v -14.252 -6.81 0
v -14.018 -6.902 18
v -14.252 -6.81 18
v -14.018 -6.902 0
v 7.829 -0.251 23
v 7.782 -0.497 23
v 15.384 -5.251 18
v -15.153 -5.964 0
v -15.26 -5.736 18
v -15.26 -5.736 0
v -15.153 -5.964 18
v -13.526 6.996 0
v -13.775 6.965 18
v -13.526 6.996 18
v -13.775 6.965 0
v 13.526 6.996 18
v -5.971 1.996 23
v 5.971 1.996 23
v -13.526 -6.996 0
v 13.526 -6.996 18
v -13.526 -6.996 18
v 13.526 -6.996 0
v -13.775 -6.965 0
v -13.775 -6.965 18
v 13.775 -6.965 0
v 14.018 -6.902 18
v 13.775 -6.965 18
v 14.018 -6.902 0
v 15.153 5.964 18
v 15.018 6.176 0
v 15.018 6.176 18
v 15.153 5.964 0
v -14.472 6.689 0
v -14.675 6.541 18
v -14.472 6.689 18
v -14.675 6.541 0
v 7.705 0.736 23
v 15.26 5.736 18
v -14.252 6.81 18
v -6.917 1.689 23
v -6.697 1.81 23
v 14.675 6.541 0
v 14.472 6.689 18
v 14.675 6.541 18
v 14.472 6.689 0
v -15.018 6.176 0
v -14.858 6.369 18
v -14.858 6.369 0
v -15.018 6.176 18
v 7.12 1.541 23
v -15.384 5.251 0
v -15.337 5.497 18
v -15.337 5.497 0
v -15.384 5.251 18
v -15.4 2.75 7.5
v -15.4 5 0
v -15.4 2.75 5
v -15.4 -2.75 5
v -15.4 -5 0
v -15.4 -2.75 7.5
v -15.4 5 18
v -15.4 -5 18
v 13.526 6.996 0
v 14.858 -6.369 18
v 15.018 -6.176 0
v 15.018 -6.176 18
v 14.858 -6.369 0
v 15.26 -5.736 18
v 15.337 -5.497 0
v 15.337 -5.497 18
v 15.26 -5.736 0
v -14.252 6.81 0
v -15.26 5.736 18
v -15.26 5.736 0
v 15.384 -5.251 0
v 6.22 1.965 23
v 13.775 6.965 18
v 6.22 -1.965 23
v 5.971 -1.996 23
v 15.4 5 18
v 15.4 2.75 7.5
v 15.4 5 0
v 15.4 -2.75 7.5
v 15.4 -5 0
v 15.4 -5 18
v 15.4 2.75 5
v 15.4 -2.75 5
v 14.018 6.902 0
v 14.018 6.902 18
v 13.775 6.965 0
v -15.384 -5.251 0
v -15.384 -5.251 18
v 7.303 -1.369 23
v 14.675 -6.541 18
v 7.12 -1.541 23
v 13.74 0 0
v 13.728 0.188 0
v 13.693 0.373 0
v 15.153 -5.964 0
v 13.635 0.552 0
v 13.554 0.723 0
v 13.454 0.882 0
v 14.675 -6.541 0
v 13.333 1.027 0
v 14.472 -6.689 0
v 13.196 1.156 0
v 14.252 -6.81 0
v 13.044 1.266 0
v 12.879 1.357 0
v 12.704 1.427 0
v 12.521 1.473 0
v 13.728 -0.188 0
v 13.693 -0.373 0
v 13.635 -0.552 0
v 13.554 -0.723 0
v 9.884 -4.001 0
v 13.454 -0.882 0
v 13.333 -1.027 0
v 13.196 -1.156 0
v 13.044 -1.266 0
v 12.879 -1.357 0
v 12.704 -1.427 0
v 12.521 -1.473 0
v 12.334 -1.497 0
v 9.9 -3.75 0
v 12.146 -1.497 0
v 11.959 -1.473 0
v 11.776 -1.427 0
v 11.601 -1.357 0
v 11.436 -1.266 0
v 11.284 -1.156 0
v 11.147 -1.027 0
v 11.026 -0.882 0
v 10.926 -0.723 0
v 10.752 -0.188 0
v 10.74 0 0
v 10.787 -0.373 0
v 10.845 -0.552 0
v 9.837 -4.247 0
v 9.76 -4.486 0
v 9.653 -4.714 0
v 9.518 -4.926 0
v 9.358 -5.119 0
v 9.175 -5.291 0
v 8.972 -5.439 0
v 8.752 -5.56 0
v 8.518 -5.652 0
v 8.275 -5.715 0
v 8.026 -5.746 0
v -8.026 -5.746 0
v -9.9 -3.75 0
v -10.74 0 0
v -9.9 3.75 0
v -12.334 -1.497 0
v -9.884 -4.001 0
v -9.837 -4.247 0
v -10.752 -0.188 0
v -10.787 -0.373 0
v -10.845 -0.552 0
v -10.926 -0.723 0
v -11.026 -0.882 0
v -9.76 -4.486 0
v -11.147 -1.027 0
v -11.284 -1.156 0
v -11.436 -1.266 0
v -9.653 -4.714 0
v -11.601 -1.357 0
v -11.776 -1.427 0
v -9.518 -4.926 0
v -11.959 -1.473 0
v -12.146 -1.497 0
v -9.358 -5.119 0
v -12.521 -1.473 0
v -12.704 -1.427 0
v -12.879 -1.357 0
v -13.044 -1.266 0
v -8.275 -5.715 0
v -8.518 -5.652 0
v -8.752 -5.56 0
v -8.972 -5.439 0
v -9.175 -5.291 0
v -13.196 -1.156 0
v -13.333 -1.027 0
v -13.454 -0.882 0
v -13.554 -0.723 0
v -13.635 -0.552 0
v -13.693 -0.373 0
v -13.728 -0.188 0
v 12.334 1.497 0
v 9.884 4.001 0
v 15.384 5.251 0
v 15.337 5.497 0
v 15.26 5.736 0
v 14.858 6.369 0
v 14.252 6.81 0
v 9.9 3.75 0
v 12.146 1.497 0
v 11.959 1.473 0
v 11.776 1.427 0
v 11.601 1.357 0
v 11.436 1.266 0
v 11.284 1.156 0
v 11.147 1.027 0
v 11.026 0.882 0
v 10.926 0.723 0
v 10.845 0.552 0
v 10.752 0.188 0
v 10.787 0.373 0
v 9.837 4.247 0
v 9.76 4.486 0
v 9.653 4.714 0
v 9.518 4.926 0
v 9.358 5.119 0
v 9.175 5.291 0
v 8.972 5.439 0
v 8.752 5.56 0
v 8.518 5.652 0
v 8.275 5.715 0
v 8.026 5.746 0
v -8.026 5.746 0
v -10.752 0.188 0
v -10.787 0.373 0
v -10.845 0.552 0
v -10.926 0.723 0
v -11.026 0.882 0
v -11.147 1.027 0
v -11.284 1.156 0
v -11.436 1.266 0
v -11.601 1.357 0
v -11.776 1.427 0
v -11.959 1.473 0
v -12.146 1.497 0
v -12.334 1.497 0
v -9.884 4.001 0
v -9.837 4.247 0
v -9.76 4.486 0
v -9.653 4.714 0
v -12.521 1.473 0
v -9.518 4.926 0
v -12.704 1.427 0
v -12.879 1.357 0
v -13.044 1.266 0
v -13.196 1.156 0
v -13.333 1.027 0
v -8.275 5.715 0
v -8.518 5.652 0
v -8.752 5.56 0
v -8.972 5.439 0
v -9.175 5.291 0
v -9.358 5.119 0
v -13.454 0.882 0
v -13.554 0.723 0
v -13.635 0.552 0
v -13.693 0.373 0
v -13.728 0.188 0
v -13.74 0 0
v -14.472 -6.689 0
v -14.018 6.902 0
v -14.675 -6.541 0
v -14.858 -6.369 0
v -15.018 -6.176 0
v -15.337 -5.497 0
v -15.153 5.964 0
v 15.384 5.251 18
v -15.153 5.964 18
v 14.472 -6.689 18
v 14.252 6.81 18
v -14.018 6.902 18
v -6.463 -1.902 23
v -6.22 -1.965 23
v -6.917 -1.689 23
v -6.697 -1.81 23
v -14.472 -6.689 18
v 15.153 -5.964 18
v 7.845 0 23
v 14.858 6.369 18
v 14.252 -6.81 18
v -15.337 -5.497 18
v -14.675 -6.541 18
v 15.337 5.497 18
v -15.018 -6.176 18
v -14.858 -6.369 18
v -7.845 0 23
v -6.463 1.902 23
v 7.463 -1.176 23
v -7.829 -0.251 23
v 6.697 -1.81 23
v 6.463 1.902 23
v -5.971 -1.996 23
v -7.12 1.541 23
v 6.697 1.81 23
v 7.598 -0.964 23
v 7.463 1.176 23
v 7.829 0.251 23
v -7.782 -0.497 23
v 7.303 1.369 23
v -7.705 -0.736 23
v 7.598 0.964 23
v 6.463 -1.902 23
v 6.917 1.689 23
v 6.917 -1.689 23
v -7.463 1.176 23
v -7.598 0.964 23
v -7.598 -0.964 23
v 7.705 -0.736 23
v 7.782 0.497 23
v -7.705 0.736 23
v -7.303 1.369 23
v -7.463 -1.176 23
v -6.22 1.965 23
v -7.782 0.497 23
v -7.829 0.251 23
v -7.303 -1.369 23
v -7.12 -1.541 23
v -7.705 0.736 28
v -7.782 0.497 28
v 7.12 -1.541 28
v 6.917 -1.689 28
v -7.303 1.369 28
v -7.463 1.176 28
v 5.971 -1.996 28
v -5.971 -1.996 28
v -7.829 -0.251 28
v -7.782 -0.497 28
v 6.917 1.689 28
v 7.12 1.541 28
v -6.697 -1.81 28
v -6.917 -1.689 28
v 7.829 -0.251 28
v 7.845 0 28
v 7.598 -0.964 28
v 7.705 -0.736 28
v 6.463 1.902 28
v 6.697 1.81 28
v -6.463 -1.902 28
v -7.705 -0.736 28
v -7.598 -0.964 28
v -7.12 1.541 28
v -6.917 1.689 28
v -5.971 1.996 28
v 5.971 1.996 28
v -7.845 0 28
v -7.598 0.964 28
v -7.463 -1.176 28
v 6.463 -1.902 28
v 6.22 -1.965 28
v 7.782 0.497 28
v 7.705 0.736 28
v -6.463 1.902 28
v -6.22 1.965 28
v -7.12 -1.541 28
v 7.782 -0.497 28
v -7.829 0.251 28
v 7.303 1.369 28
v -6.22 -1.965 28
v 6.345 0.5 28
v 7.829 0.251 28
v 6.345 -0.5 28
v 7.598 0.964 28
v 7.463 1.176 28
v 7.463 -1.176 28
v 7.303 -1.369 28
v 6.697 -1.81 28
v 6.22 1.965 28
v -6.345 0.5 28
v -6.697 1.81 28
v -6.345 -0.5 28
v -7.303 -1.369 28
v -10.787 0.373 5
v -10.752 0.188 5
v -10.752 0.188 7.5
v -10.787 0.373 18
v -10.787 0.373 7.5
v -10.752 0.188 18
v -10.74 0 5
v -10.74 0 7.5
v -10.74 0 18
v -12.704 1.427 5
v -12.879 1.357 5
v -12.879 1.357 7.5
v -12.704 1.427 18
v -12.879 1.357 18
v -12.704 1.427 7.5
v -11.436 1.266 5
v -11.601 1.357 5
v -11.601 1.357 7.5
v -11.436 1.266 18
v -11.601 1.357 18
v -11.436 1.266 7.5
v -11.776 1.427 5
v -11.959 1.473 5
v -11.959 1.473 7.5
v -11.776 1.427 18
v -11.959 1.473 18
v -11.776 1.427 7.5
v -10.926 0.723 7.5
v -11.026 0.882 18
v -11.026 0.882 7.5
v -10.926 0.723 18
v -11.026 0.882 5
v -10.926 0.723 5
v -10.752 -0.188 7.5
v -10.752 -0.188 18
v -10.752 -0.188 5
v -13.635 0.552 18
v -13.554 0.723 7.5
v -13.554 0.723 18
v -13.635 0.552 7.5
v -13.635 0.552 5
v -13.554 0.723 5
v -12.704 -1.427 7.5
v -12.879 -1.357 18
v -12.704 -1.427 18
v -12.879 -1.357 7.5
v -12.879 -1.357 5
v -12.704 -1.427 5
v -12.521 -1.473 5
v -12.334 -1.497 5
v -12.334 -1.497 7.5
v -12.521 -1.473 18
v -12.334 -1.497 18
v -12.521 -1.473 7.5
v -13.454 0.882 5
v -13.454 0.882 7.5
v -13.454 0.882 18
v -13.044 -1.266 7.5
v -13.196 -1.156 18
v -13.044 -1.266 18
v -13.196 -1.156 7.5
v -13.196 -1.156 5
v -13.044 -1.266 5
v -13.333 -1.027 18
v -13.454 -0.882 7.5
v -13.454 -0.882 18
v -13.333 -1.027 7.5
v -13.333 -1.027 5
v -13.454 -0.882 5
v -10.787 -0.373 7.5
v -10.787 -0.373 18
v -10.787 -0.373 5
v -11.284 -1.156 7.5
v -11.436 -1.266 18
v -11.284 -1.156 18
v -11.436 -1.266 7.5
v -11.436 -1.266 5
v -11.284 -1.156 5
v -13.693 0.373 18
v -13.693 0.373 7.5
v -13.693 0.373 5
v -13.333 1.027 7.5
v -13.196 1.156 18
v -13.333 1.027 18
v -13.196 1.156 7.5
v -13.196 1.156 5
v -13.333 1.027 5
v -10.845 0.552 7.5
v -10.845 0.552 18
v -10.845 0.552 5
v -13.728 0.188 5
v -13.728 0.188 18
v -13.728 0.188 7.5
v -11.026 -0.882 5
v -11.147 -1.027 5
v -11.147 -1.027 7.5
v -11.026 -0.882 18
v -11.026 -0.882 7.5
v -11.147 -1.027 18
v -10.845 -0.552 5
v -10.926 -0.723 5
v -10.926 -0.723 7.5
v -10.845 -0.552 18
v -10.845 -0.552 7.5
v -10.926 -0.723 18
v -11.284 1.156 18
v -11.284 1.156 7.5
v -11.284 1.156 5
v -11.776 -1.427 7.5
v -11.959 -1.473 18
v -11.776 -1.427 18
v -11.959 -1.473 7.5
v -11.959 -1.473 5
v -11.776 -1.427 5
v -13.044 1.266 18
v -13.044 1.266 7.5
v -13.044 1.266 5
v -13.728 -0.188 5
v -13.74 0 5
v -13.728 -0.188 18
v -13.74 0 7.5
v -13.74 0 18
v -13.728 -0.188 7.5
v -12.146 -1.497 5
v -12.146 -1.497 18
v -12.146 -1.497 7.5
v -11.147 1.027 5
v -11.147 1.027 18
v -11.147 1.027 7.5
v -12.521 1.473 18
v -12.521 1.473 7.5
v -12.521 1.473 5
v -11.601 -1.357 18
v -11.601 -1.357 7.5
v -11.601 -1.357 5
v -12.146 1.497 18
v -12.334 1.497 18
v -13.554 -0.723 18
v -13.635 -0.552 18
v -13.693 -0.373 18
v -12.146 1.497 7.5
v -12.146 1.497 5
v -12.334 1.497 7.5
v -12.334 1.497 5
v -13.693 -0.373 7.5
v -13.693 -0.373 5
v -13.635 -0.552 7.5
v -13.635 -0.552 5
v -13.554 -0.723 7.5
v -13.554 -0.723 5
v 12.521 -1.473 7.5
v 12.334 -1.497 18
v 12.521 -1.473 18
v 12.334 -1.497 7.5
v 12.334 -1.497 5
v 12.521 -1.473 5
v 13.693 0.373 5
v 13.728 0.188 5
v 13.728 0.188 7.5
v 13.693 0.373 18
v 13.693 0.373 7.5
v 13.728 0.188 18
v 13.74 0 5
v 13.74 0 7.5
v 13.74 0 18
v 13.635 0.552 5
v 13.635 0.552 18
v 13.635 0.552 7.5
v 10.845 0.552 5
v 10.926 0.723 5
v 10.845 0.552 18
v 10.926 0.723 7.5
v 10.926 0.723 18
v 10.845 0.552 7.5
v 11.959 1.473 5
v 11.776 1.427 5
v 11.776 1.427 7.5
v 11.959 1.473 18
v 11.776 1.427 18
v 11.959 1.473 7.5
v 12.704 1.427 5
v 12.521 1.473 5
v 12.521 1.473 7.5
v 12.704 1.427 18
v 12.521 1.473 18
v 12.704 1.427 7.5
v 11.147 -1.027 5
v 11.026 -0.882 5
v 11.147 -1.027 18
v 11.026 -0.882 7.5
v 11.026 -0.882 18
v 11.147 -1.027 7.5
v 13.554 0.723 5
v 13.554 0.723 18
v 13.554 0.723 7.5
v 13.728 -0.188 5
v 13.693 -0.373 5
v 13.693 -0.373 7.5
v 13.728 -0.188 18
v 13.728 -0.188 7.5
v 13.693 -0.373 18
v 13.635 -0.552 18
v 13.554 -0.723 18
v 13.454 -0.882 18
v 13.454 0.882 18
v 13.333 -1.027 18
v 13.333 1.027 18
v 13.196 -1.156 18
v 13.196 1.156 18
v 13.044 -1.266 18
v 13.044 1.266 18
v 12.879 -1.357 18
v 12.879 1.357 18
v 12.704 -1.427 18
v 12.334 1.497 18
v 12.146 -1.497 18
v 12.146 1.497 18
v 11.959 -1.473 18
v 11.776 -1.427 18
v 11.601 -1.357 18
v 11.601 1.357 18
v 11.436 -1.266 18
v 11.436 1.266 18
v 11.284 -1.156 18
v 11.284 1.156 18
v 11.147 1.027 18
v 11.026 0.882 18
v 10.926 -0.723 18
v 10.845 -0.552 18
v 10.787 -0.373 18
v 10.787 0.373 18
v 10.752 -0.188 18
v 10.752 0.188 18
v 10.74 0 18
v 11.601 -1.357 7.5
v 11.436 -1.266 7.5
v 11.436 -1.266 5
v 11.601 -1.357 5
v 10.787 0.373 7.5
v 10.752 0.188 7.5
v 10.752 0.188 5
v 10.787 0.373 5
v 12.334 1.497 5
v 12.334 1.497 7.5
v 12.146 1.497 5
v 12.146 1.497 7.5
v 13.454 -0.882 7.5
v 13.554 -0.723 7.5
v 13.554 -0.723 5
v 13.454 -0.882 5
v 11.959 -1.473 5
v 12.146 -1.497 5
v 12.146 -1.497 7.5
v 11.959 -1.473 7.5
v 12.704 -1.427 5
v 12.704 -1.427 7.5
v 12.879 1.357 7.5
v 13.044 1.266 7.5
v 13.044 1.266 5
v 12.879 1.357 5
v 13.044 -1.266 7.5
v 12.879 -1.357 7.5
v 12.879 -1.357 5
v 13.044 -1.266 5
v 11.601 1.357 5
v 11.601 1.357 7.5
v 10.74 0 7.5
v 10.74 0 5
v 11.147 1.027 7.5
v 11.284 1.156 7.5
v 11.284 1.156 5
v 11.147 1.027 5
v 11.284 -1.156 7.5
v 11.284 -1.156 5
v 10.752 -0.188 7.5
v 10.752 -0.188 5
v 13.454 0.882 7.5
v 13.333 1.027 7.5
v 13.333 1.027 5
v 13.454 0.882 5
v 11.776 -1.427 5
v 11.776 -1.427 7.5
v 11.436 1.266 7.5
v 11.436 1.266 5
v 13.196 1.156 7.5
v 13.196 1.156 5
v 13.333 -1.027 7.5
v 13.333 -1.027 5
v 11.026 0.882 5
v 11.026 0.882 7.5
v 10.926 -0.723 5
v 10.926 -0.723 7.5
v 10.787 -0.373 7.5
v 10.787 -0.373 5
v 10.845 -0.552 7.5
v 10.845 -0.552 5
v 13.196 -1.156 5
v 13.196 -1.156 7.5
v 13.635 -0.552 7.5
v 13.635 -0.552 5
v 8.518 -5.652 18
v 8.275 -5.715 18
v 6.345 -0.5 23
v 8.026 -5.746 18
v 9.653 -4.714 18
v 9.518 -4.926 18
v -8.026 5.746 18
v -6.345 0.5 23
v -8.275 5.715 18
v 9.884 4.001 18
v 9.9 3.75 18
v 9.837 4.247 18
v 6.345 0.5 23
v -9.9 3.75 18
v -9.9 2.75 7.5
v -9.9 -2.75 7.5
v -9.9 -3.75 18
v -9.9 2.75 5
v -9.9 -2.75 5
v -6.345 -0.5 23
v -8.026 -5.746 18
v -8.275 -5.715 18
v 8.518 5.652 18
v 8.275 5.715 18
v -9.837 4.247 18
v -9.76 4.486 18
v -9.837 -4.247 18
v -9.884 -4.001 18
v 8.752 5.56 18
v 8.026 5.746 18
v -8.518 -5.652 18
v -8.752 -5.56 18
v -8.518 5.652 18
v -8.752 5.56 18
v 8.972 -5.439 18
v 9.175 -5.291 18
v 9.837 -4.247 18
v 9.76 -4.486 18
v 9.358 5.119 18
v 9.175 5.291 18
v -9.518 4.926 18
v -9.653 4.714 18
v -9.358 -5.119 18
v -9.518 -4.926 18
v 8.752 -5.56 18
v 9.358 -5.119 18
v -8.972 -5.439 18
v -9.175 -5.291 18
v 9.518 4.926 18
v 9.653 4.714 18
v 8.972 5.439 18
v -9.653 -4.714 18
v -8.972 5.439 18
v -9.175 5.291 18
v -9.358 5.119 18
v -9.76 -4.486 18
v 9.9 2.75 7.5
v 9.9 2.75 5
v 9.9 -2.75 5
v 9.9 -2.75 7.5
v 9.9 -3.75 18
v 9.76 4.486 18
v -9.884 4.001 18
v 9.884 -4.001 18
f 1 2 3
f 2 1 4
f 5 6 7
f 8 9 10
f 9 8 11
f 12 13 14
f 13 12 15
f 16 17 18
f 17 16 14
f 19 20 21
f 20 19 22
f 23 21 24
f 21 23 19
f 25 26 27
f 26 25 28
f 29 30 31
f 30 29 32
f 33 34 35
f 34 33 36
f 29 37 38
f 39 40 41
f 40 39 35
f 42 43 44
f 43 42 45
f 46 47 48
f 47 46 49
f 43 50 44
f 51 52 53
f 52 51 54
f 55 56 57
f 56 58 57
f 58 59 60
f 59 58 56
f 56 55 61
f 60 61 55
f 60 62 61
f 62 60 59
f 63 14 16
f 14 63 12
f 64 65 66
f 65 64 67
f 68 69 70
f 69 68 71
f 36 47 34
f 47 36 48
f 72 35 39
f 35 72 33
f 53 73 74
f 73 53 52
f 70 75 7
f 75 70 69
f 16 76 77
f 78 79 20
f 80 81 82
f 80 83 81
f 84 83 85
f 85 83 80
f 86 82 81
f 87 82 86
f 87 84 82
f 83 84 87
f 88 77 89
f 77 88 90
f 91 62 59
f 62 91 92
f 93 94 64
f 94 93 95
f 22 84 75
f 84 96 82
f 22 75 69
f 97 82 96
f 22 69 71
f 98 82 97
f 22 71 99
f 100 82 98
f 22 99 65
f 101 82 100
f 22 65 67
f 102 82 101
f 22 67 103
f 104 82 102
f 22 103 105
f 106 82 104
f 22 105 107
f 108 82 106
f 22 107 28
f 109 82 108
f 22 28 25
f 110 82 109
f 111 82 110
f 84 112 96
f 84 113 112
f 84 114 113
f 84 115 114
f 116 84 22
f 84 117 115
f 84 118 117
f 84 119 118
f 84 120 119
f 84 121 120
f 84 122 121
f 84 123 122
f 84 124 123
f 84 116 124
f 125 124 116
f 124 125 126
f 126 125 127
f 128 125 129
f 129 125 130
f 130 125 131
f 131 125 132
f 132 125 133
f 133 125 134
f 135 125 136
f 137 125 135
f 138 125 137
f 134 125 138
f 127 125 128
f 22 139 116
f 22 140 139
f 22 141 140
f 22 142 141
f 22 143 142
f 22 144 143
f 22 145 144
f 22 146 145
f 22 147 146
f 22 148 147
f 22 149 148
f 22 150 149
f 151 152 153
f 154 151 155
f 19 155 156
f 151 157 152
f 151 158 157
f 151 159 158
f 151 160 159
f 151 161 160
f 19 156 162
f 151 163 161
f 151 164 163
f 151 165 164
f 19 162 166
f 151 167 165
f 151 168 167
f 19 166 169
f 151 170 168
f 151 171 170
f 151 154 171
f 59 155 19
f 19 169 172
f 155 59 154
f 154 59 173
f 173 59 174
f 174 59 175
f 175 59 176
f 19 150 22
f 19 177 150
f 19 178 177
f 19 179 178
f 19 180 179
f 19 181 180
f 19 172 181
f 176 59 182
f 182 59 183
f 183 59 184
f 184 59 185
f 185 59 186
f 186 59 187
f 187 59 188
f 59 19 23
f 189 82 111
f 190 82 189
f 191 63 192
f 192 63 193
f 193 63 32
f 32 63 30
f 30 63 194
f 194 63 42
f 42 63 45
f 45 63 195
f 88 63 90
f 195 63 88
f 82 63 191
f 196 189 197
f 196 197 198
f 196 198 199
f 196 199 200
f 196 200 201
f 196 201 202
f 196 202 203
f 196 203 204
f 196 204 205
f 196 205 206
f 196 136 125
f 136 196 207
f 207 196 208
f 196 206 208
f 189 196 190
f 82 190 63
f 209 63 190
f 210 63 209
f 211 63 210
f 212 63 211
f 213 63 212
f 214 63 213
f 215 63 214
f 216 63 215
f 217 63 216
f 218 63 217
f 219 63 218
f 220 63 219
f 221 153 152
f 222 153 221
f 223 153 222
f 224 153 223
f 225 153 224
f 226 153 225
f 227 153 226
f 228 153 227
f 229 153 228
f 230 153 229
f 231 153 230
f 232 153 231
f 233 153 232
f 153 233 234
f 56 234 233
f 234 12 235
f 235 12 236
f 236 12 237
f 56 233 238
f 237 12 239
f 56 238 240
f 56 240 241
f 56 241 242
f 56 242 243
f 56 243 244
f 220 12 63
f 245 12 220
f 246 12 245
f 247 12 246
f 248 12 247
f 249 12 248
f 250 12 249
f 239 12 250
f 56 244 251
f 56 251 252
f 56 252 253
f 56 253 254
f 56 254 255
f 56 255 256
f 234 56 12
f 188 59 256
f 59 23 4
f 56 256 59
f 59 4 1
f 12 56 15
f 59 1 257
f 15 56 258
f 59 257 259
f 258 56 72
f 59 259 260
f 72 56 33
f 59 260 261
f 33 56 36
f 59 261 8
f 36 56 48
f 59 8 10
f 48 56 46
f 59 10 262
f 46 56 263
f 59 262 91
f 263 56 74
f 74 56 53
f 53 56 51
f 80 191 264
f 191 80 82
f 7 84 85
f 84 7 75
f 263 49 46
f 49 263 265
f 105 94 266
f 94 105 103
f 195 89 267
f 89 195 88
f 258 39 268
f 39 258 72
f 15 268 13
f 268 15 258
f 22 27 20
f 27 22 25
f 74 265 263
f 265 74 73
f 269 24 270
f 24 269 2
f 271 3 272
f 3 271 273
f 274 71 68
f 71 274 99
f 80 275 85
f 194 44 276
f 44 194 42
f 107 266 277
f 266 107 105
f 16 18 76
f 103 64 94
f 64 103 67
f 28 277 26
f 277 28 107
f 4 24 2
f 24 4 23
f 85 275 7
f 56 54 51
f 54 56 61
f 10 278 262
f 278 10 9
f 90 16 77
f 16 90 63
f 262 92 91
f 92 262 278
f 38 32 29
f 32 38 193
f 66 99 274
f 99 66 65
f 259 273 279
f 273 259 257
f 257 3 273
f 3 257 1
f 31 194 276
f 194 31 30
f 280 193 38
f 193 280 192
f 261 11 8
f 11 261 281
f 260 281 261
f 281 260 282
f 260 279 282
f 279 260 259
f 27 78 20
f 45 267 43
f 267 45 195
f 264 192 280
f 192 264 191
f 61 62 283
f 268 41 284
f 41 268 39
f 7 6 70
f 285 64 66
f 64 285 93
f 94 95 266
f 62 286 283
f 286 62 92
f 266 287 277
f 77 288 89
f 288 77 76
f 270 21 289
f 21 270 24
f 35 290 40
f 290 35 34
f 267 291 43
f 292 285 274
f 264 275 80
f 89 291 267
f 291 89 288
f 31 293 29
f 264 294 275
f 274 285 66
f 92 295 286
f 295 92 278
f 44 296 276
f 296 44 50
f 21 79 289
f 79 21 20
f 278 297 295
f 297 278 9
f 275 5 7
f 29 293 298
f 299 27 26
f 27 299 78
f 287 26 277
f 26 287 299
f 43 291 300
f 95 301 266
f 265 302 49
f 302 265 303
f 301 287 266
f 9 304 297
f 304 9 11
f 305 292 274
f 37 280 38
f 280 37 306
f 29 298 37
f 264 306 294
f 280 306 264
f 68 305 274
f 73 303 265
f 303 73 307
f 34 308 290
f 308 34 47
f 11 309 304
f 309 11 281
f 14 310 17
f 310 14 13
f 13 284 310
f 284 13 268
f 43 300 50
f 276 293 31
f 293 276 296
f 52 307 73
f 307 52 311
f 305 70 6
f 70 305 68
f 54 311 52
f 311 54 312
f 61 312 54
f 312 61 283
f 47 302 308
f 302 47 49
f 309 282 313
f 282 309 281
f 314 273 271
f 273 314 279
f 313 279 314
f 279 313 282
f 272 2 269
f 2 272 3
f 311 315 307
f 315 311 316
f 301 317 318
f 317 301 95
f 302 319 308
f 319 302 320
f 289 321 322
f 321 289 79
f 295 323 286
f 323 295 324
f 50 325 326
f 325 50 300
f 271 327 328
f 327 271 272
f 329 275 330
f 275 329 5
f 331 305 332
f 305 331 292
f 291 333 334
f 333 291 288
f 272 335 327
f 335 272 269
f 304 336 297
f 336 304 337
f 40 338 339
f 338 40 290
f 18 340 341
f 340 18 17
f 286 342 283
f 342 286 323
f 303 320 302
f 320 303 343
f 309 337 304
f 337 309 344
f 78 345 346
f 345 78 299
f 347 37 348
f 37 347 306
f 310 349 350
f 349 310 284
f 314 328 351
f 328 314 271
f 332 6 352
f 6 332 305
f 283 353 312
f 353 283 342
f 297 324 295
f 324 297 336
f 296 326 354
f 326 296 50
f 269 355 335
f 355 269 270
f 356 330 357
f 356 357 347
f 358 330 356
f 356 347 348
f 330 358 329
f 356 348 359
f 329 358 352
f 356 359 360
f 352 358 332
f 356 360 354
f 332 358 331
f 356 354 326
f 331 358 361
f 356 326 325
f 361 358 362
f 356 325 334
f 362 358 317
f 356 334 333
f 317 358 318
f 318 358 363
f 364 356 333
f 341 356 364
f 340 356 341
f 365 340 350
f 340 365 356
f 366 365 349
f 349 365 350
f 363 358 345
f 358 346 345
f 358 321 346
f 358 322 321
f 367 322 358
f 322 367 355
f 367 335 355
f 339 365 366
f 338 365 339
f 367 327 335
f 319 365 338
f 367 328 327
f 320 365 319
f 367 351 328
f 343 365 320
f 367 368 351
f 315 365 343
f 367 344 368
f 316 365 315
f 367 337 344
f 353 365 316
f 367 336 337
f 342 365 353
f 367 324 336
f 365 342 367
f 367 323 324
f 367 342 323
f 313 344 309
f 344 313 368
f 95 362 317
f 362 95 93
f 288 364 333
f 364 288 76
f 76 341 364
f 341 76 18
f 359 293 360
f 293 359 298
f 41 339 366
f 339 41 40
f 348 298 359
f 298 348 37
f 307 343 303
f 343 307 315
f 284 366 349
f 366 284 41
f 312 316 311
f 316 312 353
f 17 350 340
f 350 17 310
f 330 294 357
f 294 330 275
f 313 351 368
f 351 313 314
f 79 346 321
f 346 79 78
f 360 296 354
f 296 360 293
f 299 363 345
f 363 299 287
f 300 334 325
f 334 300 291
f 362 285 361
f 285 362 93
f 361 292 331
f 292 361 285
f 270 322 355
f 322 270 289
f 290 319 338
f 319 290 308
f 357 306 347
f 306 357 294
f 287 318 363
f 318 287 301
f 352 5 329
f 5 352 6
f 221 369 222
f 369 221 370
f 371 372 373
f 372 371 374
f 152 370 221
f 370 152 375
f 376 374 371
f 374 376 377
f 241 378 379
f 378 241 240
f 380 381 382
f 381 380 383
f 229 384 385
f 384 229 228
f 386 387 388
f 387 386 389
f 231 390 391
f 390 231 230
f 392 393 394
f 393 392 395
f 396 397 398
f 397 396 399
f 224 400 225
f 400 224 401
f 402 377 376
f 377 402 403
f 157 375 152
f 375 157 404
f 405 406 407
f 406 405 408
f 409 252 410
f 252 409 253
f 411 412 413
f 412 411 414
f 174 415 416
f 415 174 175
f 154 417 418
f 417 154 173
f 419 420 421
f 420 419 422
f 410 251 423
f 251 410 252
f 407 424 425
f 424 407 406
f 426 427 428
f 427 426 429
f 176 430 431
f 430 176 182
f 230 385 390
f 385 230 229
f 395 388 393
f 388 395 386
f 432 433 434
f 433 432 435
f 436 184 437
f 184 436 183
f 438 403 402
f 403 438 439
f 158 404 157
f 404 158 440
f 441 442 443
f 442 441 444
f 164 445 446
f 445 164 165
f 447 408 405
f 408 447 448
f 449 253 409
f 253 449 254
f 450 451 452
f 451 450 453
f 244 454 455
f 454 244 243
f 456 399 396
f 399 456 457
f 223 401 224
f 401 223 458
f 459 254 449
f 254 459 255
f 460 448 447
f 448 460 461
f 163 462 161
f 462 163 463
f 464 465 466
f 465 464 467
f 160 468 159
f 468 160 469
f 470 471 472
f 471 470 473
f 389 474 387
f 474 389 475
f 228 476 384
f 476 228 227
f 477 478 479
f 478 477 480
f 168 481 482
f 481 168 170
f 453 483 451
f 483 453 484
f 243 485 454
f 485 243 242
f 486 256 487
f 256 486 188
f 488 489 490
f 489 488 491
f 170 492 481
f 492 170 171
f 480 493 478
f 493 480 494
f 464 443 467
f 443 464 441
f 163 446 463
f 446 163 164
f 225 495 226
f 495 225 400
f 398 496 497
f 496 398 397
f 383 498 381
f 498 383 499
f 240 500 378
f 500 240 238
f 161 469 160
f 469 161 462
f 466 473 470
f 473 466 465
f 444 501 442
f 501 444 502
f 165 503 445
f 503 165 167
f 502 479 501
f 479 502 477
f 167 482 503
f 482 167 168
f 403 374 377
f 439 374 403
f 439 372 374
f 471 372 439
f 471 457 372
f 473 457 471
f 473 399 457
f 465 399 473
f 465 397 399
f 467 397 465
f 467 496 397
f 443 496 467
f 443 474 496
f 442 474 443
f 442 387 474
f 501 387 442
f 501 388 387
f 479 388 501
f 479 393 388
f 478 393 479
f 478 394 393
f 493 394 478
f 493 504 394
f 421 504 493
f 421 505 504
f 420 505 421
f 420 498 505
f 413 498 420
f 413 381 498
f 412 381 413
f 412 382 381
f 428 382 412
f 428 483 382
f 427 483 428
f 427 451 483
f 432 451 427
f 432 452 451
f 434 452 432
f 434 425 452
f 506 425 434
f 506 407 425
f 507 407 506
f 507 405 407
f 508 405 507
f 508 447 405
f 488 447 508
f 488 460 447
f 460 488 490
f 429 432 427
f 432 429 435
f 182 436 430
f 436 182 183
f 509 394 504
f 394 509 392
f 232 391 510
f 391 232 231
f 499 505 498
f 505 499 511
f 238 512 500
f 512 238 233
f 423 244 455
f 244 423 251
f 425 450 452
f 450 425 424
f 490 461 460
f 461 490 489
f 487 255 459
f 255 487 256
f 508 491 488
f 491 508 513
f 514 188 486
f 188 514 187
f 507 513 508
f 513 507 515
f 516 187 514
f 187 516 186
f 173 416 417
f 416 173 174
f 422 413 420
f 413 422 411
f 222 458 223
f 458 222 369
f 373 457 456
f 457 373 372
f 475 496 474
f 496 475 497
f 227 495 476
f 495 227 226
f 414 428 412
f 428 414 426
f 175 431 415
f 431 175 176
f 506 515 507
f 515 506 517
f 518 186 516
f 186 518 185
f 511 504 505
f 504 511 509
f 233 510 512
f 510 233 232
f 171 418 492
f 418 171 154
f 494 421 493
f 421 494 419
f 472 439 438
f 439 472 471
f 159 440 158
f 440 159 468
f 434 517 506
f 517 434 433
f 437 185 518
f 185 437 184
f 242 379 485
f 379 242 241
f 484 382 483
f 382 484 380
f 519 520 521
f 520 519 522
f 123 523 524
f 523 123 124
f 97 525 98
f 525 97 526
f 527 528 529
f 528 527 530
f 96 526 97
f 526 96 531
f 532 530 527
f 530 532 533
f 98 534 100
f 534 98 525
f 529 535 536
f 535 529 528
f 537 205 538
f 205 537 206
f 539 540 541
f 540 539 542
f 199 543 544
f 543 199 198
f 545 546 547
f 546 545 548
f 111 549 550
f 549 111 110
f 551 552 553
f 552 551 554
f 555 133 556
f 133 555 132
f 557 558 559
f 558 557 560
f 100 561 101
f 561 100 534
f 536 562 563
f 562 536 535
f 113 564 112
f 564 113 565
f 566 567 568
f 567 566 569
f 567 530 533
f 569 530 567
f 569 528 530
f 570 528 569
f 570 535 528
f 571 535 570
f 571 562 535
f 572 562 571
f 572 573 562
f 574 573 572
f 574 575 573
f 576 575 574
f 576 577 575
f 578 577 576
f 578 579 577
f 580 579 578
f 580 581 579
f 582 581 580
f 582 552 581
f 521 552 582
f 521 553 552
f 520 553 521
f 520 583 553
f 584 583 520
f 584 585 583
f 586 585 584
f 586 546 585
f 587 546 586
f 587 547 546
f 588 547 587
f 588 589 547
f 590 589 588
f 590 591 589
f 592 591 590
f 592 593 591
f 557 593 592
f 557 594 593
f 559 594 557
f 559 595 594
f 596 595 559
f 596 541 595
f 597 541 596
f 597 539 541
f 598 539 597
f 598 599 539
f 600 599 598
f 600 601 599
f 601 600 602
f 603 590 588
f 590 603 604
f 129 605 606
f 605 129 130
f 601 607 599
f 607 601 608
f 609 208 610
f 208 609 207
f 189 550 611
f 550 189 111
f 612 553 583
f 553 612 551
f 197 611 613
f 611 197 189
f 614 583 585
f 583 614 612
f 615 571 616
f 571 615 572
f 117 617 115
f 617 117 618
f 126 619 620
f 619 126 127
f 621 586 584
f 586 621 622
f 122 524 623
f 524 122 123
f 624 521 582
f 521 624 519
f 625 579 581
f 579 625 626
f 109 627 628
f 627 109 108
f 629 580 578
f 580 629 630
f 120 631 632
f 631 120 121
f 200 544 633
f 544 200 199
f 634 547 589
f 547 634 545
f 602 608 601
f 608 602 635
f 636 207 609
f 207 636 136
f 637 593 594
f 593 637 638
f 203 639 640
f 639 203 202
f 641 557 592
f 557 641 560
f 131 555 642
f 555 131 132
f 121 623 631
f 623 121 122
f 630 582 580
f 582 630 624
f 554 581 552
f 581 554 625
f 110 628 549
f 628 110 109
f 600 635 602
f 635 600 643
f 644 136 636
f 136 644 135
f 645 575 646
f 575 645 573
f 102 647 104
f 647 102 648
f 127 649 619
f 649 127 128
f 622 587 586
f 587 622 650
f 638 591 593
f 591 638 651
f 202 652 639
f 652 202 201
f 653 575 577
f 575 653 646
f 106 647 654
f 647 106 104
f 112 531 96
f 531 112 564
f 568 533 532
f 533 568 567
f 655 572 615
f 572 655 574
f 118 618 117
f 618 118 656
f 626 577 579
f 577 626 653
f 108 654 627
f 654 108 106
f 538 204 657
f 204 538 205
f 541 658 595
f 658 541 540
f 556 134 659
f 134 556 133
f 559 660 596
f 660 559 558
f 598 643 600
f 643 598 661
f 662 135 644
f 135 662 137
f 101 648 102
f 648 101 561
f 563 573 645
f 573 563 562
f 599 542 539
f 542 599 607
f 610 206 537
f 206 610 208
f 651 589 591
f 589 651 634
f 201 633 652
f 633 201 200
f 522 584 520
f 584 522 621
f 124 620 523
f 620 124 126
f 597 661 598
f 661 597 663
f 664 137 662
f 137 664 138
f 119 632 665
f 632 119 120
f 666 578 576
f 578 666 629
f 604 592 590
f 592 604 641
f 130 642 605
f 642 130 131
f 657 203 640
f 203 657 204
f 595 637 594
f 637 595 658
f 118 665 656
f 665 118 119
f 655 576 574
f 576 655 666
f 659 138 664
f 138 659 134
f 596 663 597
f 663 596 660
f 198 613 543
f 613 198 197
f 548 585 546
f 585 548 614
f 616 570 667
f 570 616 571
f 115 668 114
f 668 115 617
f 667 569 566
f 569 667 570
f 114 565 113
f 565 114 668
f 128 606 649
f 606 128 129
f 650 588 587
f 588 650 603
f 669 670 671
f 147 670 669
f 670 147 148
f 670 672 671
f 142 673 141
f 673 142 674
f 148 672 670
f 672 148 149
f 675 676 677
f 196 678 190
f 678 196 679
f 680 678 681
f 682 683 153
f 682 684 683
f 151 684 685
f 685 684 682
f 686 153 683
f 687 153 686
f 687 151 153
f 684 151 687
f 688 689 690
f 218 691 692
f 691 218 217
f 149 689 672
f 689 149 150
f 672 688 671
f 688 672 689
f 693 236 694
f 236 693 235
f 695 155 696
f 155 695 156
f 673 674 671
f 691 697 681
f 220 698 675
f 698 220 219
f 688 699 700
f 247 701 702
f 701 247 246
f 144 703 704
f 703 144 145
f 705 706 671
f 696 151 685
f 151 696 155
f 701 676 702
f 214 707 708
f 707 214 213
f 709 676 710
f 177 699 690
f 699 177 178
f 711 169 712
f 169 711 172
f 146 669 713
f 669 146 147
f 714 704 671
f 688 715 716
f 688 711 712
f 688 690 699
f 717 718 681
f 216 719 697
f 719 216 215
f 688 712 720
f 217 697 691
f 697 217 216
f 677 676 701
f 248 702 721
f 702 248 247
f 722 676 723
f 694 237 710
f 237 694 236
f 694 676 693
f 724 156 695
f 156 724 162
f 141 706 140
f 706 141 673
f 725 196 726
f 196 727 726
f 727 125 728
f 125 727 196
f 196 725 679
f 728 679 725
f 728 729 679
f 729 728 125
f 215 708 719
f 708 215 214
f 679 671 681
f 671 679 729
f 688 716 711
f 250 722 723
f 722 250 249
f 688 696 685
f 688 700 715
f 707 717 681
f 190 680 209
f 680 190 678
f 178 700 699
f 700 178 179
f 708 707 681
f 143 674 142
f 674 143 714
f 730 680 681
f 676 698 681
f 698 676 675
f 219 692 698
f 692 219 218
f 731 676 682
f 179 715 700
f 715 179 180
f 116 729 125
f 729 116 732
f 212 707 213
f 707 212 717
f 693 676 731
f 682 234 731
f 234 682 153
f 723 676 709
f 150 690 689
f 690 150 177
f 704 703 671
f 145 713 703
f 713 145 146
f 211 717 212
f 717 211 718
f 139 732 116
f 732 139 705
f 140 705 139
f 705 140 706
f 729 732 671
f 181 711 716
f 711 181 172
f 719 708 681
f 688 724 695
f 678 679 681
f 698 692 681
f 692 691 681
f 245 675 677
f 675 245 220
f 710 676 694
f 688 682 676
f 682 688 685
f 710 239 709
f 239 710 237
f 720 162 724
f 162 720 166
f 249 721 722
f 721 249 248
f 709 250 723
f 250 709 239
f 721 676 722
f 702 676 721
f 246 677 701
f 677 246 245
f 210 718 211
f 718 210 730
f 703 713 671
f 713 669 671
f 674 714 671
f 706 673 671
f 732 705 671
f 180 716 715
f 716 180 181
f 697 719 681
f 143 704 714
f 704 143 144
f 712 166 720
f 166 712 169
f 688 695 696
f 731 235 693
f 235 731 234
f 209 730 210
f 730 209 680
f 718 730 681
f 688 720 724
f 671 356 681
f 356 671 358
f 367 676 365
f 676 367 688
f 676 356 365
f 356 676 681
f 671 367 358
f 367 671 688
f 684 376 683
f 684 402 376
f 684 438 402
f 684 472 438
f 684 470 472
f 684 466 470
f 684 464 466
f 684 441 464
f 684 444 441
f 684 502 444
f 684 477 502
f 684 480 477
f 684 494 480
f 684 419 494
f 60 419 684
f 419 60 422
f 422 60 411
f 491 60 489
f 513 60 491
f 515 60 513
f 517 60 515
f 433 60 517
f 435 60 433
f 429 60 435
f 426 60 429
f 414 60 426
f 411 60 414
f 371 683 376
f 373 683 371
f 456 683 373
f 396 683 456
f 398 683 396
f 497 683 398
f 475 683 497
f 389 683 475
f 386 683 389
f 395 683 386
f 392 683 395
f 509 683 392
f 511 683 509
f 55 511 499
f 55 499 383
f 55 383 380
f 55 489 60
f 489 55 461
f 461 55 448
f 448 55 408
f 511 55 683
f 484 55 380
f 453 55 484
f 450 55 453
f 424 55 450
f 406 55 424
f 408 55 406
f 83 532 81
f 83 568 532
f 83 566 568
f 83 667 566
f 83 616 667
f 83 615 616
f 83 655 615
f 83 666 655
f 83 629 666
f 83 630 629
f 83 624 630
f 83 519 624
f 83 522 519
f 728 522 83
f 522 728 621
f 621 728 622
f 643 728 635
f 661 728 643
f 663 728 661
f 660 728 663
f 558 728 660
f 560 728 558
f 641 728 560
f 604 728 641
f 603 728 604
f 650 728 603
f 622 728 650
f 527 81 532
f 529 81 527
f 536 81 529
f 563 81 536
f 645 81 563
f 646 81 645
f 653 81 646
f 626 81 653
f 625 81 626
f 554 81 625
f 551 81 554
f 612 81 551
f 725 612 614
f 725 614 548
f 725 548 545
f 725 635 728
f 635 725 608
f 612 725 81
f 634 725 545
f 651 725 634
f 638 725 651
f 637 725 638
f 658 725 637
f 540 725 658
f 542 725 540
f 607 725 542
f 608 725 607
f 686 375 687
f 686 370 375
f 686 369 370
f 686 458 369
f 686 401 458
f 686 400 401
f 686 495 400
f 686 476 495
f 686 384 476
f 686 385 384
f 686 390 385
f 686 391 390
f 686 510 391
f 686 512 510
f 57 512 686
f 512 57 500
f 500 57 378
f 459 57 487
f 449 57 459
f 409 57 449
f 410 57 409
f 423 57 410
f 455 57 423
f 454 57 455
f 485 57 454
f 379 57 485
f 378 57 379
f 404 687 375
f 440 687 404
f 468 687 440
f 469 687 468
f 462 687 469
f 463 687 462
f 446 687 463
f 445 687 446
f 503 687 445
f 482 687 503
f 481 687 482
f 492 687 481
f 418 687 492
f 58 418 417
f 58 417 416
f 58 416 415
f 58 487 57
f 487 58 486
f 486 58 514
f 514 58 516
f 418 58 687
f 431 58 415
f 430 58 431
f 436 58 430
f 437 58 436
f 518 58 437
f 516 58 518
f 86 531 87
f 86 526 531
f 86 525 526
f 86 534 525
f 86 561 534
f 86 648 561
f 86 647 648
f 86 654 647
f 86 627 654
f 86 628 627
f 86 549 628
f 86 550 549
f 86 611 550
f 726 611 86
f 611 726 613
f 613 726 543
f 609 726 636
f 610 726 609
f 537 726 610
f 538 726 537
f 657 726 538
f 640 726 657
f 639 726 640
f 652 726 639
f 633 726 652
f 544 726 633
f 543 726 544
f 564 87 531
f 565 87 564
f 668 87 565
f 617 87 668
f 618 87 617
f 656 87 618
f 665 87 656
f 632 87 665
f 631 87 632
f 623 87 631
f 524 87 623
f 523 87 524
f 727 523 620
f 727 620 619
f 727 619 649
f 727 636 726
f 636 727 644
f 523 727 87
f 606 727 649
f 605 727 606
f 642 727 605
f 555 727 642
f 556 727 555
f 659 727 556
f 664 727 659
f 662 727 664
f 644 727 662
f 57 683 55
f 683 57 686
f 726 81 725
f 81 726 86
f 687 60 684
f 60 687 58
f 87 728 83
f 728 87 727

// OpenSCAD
// file: lib/chassis-connector-housing.scad
// Chassis Connector Housing
// By Hans Christian Saustrup <hc@saustrup.net>
model_version = "v0.0.1";

ds = 3.0;
t = 1.5;

module flat_rounded_cube(size, d=4) {
    _size = [
        size.x - d,
        size.y - d,
        size.z
    ];

    translate([d/2, d/2])
    hull()
    for (x=[0, 1])
    for (y=[0, 1])
    translate([
        x * _size.x,
        y * _size.y,
        0
    ])
    cylinder(d=d, h=_size.z);
}

module _cube(size, d=4) {
    flat_rounded_cube(size, d);
    // cube(size);
}

module __generic_chassis_connector_housing(cutout, screw_distance, wires) {

    echo(["Cutout:", cutout]);
    echo(["Screw distance:", screw_distance]);

    // Flat cable - leave room for one extra wire
    cable_pitch = 1.269;
    cable_hole = [wires * cable_pitch, 1, 5];

    house1 = [
        screw_distance + 6.32,
        cutout.y + 1 + t,
        18
    ];

    house1_cutout = [
        cutout.x,
        cutout.y,
        house1.z
    ];

    house2 = [
        cable_hole.x + (2*t),
        cable_hole.y + (2*t),
        cable_hole.z
    ];
    house2_cutout = cable_hole;

    screw_cutout = [
        house1.x,
        5.5, // Nut width
        2.5 // Nut height
    ];

    difference() {
        union() {
            hull() {
                translate([-house1.x/2, -house1.y/2])
                _cube(house1, d=4);
                translate([-house2.x/2, -house2.y/2, house1.z])
                _cube(house2);
            }
            translate([-house2.x/2, -house2.y/2, house1.z + house2.z])
            _cube(house2);
        }
        union() {
            hull() {
                translate([-house1_cutout.x/2, -house1_cutout.y/2])
                _cube(house1_cutout);
                translate([-house2_cutout.x/2, -house2_cutout.y/2, house1.z])
                cube(house2_cutout);
            }
            translate([-house2_cutout.x/2, -house2_cutout.y/2, house1.z + house2.z])
            cube(house2_cutout);

            translate([-screw_cutout.x/2, -screw_cutout.y/2, screw_cutout.z * 2])
            cube(screw_cutout);

            for (x=[-0.5,0.5])
            translate([screw_distance*x, 0])
            cylinder(r=ds/2, h=house1.z);
        }
    }

}

module chassis_connector_housing_db(pins, wires=0) {
    // Row with most pins:
    maxpins = pins - floor(pins/2);

    pin_pitch = 2.775;
    pin_width = 1.7;
    pin_to_pin = (maxpins-1) * pin_pitch + pin_width;

    inside = [
        pin_to_pin + 7,
        11.5,
        5
    ];

    screw_distance = inside.x + 4.68;
    __generic_chassis_connector_housing(inside, screw_distance, wires != 0 ? wires : pins + 1);
}

module chassis_connector_housing_centronics(pins, wires=0) {
    pin_columns = pins / 2;

    pin_pitch = 2.11;
    pin_width = 1.20;
    pin_to_pin = (pin_columns - 1) * pin_pitch + pin_width;

    __generic_chassis_connector_housing(
        [
            pin_to_pin + 10.5,
            15,
            3.5
        ],
        pin_to_pin + 22.5,
        wires
    );
}
// main file
use <lib/chassis-connector-housing.scad>;

$fn = $preview ? 0 : 50;

chassis_connector_housing_db(9);
